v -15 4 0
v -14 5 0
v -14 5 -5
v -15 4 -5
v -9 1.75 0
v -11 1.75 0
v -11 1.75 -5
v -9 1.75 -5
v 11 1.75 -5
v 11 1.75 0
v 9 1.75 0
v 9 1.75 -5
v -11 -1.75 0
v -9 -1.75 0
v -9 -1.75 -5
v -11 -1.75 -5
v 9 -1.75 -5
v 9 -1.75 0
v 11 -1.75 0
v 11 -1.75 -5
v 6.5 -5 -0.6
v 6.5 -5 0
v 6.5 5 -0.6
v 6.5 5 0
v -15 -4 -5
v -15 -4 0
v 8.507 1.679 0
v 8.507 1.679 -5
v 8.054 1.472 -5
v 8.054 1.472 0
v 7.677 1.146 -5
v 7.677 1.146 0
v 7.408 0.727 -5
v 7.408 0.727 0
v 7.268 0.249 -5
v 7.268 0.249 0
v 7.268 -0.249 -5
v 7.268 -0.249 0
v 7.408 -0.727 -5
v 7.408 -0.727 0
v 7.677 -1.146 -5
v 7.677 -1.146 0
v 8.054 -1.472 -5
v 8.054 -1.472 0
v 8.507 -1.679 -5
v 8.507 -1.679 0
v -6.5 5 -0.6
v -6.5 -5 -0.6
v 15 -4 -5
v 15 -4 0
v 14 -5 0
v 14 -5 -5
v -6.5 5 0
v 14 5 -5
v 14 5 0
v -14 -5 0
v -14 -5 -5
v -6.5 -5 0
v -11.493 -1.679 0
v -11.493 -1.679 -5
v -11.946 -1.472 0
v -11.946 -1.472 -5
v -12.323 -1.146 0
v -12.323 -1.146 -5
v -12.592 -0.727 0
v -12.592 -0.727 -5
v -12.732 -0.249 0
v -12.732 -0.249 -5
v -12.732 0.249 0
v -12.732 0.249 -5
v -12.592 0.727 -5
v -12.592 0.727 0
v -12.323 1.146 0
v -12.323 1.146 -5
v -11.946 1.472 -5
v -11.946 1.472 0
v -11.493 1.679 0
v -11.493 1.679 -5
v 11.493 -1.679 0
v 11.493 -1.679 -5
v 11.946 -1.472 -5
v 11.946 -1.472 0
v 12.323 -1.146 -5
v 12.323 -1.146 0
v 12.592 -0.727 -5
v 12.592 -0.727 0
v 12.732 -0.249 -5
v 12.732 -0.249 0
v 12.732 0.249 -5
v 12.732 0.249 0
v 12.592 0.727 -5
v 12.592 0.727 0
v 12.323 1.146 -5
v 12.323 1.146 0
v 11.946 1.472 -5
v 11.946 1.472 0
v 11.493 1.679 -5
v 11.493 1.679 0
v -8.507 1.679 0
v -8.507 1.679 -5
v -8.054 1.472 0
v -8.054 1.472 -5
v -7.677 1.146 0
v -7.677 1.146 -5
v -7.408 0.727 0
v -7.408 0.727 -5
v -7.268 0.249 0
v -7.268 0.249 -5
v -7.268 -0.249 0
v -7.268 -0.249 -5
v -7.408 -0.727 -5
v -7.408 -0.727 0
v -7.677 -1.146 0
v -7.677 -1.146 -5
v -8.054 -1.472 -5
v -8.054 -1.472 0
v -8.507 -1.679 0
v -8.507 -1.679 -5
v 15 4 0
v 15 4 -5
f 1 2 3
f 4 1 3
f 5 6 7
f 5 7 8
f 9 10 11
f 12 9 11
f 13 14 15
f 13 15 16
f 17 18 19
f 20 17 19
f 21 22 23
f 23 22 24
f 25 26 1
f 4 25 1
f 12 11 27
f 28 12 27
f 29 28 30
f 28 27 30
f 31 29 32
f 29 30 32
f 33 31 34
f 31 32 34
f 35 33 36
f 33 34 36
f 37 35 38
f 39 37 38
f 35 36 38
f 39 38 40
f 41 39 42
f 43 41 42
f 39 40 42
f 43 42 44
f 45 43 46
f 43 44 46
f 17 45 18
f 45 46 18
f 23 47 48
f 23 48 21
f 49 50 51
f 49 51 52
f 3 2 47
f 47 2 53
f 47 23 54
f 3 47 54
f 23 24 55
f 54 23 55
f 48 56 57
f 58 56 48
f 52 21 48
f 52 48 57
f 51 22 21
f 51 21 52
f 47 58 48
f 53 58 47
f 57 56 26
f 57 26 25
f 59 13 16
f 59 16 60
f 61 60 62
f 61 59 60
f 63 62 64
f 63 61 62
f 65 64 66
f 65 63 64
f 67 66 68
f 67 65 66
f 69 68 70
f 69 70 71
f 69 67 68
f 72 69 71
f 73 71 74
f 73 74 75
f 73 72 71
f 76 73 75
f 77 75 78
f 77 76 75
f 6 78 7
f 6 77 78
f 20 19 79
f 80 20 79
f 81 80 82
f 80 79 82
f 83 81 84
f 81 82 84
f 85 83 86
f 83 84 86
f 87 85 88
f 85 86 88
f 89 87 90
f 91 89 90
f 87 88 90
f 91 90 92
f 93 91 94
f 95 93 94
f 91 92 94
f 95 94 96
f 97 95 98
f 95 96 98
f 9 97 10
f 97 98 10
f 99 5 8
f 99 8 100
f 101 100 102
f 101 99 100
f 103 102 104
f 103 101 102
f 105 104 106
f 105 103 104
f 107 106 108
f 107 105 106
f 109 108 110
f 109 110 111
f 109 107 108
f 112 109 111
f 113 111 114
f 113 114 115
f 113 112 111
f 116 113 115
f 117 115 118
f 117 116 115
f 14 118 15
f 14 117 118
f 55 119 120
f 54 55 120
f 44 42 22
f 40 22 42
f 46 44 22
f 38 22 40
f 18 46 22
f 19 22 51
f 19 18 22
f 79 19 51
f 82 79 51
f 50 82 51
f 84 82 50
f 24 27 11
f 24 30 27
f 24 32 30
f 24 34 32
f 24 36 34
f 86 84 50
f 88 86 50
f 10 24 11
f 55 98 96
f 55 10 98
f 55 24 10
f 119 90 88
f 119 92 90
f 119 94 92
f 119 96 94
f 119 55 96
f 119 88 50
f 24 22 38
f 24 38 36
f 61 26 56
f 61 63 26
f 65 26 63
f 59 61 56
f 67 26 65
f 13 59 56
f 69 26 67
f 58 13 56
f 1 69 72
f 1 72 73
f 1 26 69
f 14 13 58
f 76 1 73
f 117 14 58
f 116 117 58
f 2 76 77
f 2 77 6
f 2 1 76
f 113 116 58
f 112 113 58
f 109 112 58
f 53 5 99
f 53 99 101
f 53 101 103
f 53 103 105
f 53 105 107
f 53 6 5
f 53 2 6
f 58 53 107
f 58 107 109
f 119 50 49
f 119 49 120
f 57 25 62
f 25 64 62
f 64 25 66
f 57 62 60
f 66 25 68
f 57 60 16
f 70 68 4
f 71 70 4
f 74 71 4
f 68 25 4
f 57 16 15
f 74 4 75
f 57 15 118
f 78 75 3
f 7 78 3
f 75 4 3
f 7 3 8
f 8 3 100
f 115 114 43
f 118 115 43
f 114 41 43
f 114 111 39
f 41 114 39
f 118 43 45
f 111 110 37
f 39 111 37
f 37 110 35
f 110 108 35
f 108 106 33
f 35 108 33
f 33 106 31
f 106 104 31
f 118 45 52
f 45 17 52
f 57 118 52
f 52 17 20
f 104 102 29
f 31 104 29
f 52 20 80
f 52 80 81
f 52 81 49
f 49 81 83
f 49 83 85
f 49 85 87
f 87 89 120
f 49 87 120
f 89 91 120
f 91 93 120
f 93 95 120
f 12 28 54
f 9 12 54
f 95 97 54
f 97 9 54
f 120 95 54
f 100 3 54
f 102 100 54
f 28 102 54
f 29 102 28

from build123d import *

# Parameters (mm, degrees)
SCHIZZO2_W                   = 30
SCHIZZO2_H                   = 10
ESTRUSIONE_ESTRUSIONE1_DEPTH = 5
SCHIZZO3_W                   = 13
SCHIZZO3_H                   = 10
TAGLIO_ESTRUSIONE1_DEPTH     = 0.6
SMUSSO1_SIZE                 = 1


with BuildPart() as part:
    # Schizzo2 → Estrusione-Estrusione1 (new body)
    with BuildSketch(Plane.XY):
        Rectangle(SCHIZZO2_W, SCHIZZO2_H)
        with BuildLine():
            Line((-9, -1.75), (-11, -1.75))
            ThreePointArc((-11, -1.75), (-12.75, 0), (-11, 1.75))
            Line((-11, 1.75), (-9, 1.75))
            ThreePointArc((-9, 1.75), (-7.25, 0), (-9, -1.75))
        make_face(mode=Mode.SUBTRACT)
        with BuildLine():
            Line((9, -1.75), (11, -1.75))
            ThreePointArc((11, -1.75), (12.75, 0), (11, 1.75))
            Line((11, 1.75), (9, 1.75))
            ThreePointArc((9, 1.75), (7.25, 0), (9, -1.75))
        make_face(mode=Mode.SUBTRACT)
    extrude(amount=-ESTRUSIONE_ESTRUSIONE1_DEPTH)

    # Schizzo3 → Taglio-Estrusione1 (cut)
    with BuildSketch(Plane.XY):
        Rectangle(SCHIZZO3_W, SCHIZZO3_H)
    extrude(amount=-TAGLIO_ESTRUSIONE1_DEPTH, mode=Mode.SUBTRACT)

    # Smusso1
    smusso1_edges = [part.edges().sort_by_distance(p)[0] for p in [
        (-15, 5, -2.5),
        (15, 5, -2.5),
        (15, -5, -2.5),
        (-15, -5, -2.5),
    ]]
    chamfer(smusso1_edges, length=SMUSSO1_SIZE)


solid = part.part
